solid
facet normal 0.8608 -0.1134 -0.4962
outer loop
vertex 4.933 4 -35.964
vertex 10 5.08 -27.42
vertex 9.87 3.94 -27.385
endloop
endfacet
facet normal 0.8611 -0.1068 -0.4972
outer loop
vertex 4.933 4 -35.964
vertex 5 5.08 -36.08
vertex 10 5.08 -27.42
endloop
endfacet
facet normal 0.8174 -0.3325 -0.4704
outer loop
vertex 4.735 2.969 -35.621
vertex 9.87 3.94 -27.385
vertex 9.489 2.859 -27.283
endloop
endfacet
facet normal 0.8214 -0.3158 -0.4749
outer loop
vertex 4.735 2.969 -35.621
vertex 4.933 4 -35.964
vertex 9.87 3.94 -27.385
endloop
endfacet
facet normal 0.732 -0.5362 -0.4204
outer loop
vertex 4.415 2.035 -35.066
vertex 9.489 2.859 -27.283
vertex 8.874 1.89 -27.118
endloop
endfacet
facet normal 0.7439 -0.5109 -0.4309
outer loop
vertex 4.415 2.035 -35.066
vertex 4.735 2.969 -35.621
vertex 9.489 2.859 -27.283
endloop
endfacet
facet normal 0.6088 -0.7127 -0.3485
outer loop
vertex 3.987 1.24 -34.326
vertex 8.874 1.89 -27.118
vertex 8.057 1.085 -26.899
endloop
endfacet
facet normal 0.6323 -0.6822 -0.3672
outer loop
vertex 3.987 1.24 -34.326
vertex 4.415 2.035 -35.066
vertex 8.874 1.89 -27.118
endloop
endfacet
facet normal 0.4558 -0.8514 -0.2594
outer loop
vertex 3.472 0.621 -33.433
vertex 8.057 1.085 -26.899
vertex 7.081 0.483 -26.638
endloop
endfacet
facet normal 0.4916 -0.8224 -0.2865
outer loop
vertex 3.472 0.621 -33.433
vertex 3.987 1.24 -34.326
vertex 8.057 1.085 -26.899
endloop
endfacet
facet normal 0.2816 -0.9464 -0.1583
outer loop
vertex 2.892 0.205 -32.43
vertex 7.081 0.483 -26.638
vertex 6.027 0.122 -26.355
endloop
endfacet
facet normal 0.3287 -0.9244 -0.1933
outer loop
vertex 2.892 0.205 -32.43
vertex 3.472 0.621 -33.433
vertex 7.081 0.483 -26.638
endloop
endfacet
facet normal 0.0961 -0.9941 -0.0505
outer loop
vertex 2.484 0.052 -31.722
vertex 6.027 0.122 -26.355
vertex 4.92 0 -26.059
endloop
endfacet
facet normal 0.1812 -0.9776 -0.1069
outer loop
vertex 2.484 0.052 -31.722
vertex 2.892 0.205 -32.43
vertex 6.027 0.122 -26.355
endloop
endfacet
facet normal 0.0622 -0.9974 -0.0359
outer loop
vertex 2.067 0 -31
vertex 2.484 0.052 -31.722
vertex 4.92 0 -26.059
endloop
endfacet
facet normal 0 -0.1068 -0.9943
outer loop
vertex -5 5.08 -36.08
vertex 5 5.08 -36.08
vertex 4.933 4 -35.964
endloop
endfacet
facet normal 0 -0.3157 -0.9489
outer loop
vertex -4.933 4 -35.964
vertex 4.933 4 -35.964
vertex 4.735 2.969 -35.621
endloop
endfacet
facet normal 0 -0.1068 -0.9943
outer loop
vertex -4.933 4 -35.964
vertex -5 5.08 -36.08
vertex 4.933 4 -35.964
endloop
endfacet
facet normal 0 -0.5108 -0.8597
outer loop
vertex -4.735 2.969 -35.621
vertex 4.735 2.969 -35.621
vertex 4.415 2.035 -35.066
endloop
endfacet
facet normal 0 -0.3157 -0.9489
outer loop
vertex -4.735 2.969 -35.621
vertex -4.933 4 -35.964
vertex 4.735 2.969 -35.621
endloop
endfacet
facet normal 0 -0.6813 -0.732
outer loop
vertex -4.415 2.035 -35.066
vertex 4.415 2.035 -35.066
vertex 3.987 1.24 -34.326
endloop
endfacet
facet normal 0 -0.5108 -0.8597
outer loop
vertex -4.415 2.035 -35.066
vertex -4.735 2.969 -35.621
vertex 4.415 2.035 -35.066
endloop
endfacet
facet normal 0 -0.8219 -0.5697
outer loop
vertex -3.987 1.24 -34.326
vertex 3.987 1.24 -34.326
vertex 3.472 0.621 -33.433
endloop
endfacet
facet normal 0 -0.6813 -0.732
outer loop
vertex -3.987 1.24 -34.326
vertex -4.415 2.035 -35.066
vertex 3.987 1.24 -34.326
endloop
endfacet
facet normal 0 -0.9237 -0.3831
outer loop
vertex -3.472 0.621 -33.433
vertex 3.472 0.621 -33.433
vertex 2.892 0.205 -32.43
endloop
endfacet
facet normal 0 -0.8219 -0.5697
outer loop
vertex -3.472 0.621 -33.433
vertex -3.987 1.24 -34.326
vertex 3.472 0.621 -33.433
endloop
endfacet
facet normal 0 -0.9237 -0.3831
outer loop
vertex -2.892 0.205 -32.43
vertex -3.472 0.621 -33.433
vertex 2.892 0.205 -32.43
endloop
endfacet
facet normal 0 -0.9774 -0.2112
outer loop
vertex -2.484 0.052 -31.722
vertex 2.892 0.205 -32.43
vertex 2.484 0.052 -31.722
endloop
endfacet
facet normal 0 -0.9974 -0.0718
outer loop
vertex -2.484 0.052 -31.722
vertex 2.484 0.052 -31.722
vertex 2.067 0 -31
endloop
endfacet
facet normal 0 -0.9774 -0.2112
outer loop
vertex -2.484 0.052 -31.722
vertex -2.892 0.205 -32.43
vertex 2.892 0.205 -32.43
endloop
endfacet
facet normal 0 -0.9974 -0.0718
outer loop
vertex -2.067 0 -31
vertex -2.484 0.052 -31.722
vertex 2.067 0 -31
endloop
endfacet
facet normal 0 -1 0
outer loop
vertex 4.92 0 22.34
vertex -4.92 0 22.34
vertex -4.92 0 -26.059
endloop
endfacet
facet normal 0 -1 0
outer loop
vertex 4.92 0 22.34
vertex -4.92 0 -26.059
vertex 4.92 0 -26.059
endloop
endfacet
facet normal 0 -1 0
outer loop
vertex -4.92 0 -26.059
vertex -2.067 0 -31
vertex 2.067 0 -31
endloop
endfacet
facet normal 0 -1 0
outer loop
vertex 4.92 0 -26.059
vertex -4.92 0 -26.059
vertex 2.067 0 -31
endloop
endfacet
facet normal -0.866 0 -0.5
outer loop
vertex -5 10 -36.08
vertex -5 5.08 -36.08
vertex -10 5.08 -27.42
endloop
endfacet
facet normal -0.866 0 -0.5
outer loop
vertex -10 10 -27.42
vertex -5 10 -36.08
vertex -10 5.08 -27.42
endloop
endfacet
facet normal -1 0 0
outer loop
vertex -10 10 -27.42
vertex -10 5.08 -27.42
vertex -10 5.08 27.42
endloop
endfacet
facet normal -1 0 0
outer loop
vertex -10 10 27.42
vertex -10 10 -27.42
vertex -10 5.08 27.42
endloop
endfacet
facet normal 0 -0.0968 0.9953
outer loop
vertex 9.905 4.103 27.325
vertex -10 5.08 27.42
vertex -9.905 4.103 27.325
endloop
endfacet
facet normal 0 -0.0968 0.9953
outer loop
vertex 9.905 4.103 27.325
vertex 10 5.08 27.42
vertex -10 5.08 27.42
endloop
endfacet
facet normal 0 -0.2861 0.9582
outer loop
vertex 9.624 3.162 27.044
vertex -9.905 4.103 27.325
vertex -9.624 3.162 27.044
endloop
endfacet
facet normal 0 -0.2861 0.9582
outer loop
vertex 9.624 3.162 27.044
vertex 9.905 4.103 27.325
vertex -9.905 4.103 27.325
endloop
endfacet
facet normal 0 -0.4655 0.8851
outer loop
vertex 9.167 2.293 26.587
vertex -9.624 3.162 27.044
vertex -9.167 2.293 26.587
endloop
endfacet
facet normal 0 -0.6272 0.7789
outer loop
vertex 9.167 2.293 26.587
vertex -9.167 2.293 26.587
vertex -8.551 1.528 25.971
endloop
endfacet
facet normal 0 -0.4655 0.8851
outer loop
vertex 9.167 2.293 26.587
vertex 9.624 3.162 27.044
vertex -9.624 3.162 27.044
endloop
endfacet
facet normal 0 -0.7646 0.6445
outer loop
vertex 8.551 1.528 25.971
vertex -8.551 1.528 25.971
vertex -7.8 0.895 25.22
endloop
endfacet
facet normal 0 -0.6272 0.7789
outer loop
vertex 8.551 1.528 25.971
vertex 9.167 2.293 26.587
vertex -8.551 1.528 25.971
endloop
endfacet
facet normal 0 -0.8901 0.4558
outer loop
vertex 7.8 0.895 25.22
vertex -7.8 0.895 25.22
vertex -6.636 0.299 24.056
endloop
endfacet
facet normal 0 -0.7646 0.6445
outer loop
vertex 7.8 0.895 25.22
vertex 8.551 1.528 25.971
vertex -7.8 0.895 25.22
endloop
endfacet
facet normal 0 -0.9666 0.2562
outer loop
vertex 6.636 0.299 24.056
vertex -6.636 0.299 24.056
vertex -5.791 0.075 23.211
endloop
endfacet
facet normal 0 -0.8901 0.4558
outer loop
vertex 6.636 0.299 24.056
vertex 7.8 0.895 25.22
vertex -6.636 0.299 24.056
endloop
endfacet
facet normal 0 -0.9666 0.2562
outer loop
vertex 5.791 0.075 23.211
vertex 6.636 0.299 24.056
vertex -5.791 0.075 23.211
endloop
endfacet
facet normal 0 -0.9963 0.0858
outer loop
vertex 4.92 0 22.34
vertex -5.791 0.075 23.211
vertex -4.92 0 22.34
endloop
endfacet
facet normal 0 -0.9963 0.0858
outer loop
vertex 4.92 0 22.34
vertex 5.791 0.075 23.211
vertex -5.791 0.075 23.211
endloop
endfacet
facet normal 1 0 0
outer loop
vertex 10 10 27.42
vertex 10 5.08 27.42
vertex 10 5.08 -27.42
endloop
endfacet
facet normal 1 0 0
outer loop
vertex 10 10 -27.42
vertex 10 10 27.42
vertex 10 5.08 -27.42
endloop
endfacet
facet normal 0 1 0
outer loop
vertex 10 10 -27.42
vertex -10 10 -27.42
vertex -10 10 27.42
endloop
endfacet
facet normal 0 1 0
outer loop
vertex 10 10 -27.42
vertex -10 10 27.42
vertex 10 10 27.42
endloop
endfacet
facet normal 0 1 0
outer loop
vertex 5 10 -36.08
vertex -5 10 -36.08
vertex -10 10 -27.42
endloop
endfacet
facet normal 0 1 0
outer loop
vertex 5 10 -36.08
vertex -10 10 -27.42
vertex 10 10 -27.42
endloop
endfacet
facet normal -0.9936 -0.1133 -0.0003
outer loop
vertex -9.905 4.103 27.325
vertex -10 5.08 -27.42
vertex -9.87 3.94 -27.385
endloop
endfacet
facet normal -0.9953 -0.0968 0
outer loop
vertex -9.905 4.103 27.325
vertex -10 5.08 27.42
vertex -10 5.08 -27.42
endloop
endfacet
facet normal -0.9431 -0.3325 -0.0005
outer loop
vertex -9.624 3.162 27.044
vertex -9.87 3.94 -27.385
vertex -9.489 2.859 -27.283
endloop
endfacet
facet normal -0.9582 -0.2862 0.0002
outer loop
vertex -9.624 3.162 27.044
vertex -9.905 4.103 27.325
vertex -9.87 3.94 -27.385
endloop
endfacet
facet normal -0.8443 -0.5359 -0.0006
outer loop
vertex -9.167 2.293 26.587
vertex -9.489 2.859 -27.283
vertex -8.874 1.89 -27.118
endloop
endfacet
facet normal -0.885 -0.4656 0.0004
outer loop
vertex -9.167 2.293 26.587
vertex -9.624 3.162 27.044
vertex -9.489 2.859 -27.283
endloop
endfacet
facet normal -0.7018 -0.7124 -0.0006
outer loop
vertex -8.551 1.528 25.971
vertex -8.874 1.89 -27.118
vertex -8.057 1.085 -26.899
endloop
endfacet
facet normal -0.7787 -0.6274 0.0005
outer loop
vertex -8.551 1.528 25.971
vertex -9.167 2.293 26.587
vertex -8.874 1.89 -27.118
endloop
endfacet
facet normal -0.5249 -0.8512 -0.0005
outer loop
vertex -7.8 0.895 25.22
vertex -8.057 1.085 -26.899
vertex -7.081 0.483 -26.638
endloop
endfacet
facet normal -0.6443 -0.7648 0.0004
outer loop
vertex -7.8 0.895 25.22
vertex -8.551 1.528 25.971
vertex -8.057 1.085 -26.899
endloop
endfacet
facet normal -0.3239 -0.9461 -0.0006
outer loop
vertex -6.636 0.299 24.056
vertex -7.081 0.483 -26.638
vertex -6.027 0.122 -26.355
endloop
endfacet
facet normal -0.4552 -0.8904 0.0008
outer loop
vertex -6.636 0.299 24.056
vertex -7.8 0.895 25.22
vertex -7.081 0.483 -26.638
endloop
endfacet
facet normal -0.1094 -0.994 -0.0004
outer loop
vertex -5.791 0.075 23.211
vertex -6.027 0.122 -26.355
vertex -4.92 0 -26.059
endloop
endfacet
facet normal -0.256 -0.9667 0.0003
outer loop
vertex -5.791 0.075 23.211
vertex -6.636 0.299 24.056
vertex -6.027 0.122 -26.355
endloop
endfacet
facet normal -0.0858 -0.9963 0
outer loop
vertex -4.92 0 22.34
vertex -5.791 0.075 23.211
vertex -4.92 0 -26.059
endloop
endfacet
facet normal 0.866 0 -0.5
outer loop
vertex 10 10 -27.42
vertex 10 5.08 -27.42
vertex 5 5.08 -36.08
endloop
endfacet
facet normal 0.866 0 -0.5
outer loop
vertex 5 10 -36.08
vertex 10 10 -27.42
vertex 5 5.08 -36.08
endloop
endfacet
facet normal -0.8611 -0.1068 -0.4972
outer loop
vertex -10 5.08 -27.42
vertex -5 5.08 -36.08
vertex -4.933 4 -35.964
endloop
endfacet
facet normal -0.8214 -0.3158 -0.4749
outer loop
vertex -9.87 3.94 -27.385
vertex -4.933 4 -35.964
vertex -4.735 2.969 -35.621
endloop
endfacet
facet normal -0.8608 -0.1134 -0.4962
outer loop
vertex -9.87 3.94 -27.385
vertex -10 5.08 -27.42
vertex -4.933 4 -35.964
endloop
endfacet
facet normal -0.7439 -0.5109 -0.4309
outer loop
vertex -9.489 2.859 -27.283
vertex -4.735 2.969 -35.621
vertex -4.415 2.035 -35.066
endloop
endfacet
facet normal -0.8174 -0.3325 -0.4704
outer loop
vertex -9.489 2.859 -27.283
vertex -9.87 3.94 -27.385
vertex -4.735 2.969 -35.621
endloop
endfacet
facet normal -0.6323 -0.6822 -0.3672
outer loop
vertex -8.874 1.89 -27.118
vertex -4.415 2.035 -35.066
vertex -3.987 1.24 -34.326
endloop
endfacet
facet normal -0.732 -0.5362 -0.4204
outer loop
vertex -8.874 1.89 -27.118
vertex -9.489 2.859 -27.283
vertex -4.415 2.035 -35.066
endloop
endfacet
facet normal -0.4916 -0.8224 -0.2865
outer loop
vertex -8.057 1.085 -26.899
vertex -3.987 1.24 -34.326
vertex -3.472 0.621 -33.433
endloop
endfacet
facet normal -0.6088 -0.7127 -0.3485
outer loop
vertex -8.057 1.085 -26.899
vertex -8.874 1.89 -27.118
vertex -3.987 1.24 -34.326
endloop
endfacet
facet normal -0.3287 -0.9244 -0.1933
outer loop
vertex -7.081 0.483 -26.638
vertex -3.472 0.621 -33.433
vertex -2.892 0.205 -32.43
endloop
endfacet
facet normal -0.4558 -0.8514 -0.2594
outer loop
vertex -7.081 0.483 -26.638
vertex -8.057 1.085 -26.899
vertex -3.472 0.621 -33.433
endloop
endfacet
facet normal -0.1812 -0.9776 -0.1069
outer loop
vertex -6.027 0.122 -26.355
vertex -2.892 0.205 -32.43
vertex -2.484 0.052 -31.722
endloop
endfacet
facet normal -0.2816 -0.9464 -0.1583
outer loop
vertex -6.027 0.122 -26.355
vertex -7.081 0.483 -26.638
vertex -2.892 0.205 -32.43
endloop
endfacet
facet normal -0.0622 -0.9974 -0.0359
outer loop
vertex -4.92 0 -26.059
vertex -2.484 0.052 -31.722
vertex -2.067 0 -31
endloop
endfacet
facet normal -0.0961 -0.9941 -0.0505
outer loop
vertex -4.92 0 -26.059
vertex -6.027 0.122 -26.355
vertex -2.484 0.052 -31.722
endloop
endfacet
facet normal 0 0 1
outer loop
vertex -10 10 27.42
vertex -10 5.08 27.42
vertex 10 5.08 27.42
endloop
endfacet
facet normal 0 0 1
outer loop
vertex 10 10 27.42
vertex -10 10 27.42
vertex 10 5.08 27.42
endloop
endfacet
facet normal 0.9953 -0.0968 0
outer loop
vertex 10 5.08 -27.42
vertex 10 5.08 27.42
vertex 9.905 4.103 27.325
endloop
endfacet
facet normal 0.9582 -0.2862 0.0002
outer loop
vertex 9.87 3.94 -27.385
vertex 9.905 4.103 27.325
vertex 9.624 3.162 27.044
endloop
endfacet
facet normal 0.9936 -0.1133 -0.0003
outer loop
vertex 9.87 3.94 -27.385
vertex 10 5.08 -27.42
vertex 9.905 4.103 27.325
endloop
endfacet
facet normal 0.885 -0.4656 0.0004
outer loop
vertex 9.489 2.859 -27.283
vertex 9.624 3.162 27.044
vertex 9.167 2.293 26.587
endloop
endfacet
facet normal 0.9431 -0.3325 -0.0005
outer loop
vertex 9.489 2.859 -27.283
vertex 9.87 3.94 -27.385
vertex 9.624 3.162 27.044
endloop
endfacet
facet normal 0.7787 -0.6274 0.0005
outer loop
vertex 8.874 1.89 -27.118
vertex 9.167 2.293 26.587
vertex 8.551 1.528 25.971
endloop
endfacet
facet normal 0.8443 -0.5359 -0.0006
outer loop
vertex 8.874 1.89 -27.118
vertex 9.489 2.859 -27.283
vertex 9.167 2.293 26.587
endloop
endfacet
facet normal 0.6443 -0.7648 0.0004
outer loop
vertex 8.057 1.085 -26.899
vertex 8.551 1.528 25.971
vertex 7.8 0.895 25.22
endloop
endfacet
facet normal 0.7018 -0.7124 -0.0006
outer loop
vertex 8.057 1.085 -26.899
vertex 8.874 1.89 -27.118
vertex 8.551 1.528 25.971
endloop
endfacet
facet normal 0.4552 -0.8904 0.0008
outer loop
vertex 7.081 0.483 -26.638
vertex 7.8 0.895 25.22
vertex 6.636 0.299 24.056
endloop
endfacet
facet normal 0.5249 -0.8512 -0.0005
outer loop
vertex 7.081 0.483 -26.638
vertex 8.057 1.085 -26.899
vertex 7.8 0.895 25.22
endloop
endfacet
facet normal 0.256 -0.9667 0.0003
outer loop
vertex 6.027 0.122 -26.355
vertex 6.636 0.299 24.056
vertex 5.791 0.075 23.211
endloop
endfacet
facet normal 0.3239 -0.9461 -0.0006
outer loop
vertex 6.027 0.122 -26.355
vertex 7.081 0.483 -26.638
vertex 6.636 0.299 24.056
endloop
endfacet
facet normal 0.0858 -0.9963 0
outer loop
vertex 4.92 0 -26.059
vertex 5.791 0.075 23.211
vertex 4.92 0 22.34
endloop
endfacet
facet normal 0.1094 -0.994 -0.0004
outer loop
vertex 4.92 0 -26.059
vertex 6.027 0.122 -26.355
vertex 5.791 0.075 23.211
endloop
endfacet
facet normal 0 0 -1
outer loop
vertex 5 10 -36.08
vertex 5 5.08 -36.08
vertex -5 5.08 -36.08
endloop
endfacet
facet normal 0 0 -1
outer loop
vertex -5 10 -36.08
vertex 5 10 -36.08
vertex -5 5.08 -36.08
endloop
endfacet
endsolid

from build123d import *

# Parameters (mm, degrees)
BOSS_EXTRUDE1_DEPTH = 10
FILLET1_R           = 5.08


with BuildPart() as part:
    # Sketch1 → Boss-Extrude1 (new body)
    with BuildSketch(Plane(origin=(0, 0, 0), x_dir=(1, 0, 0), z_dir=(0, 1, 0))):
        Polygon((10, -27.419872981), (10, 27.419872981), (5, 36.080127019), (-5, 36.080127019), (-10, 27.419872981), (-10, -27.419872981), align=None)
    extrude(amount=BOSS_EXTRUDE1_DEPTH)

    # Fillet1
    fillet1_edges = [part.edges().sort_by_distance(p)[0] for p in [
        (-10, 0, 0),
        (-7.5, 0, -31.75),
        (0, 0, -36.080127019),
        (7.5, 0, -31.75),
        (10, 0, 0),
        (0, 0, 27.419872981),
    ]]
    fillet(fillet1_edges, radius=FILLET1_R)


solid = part.part
